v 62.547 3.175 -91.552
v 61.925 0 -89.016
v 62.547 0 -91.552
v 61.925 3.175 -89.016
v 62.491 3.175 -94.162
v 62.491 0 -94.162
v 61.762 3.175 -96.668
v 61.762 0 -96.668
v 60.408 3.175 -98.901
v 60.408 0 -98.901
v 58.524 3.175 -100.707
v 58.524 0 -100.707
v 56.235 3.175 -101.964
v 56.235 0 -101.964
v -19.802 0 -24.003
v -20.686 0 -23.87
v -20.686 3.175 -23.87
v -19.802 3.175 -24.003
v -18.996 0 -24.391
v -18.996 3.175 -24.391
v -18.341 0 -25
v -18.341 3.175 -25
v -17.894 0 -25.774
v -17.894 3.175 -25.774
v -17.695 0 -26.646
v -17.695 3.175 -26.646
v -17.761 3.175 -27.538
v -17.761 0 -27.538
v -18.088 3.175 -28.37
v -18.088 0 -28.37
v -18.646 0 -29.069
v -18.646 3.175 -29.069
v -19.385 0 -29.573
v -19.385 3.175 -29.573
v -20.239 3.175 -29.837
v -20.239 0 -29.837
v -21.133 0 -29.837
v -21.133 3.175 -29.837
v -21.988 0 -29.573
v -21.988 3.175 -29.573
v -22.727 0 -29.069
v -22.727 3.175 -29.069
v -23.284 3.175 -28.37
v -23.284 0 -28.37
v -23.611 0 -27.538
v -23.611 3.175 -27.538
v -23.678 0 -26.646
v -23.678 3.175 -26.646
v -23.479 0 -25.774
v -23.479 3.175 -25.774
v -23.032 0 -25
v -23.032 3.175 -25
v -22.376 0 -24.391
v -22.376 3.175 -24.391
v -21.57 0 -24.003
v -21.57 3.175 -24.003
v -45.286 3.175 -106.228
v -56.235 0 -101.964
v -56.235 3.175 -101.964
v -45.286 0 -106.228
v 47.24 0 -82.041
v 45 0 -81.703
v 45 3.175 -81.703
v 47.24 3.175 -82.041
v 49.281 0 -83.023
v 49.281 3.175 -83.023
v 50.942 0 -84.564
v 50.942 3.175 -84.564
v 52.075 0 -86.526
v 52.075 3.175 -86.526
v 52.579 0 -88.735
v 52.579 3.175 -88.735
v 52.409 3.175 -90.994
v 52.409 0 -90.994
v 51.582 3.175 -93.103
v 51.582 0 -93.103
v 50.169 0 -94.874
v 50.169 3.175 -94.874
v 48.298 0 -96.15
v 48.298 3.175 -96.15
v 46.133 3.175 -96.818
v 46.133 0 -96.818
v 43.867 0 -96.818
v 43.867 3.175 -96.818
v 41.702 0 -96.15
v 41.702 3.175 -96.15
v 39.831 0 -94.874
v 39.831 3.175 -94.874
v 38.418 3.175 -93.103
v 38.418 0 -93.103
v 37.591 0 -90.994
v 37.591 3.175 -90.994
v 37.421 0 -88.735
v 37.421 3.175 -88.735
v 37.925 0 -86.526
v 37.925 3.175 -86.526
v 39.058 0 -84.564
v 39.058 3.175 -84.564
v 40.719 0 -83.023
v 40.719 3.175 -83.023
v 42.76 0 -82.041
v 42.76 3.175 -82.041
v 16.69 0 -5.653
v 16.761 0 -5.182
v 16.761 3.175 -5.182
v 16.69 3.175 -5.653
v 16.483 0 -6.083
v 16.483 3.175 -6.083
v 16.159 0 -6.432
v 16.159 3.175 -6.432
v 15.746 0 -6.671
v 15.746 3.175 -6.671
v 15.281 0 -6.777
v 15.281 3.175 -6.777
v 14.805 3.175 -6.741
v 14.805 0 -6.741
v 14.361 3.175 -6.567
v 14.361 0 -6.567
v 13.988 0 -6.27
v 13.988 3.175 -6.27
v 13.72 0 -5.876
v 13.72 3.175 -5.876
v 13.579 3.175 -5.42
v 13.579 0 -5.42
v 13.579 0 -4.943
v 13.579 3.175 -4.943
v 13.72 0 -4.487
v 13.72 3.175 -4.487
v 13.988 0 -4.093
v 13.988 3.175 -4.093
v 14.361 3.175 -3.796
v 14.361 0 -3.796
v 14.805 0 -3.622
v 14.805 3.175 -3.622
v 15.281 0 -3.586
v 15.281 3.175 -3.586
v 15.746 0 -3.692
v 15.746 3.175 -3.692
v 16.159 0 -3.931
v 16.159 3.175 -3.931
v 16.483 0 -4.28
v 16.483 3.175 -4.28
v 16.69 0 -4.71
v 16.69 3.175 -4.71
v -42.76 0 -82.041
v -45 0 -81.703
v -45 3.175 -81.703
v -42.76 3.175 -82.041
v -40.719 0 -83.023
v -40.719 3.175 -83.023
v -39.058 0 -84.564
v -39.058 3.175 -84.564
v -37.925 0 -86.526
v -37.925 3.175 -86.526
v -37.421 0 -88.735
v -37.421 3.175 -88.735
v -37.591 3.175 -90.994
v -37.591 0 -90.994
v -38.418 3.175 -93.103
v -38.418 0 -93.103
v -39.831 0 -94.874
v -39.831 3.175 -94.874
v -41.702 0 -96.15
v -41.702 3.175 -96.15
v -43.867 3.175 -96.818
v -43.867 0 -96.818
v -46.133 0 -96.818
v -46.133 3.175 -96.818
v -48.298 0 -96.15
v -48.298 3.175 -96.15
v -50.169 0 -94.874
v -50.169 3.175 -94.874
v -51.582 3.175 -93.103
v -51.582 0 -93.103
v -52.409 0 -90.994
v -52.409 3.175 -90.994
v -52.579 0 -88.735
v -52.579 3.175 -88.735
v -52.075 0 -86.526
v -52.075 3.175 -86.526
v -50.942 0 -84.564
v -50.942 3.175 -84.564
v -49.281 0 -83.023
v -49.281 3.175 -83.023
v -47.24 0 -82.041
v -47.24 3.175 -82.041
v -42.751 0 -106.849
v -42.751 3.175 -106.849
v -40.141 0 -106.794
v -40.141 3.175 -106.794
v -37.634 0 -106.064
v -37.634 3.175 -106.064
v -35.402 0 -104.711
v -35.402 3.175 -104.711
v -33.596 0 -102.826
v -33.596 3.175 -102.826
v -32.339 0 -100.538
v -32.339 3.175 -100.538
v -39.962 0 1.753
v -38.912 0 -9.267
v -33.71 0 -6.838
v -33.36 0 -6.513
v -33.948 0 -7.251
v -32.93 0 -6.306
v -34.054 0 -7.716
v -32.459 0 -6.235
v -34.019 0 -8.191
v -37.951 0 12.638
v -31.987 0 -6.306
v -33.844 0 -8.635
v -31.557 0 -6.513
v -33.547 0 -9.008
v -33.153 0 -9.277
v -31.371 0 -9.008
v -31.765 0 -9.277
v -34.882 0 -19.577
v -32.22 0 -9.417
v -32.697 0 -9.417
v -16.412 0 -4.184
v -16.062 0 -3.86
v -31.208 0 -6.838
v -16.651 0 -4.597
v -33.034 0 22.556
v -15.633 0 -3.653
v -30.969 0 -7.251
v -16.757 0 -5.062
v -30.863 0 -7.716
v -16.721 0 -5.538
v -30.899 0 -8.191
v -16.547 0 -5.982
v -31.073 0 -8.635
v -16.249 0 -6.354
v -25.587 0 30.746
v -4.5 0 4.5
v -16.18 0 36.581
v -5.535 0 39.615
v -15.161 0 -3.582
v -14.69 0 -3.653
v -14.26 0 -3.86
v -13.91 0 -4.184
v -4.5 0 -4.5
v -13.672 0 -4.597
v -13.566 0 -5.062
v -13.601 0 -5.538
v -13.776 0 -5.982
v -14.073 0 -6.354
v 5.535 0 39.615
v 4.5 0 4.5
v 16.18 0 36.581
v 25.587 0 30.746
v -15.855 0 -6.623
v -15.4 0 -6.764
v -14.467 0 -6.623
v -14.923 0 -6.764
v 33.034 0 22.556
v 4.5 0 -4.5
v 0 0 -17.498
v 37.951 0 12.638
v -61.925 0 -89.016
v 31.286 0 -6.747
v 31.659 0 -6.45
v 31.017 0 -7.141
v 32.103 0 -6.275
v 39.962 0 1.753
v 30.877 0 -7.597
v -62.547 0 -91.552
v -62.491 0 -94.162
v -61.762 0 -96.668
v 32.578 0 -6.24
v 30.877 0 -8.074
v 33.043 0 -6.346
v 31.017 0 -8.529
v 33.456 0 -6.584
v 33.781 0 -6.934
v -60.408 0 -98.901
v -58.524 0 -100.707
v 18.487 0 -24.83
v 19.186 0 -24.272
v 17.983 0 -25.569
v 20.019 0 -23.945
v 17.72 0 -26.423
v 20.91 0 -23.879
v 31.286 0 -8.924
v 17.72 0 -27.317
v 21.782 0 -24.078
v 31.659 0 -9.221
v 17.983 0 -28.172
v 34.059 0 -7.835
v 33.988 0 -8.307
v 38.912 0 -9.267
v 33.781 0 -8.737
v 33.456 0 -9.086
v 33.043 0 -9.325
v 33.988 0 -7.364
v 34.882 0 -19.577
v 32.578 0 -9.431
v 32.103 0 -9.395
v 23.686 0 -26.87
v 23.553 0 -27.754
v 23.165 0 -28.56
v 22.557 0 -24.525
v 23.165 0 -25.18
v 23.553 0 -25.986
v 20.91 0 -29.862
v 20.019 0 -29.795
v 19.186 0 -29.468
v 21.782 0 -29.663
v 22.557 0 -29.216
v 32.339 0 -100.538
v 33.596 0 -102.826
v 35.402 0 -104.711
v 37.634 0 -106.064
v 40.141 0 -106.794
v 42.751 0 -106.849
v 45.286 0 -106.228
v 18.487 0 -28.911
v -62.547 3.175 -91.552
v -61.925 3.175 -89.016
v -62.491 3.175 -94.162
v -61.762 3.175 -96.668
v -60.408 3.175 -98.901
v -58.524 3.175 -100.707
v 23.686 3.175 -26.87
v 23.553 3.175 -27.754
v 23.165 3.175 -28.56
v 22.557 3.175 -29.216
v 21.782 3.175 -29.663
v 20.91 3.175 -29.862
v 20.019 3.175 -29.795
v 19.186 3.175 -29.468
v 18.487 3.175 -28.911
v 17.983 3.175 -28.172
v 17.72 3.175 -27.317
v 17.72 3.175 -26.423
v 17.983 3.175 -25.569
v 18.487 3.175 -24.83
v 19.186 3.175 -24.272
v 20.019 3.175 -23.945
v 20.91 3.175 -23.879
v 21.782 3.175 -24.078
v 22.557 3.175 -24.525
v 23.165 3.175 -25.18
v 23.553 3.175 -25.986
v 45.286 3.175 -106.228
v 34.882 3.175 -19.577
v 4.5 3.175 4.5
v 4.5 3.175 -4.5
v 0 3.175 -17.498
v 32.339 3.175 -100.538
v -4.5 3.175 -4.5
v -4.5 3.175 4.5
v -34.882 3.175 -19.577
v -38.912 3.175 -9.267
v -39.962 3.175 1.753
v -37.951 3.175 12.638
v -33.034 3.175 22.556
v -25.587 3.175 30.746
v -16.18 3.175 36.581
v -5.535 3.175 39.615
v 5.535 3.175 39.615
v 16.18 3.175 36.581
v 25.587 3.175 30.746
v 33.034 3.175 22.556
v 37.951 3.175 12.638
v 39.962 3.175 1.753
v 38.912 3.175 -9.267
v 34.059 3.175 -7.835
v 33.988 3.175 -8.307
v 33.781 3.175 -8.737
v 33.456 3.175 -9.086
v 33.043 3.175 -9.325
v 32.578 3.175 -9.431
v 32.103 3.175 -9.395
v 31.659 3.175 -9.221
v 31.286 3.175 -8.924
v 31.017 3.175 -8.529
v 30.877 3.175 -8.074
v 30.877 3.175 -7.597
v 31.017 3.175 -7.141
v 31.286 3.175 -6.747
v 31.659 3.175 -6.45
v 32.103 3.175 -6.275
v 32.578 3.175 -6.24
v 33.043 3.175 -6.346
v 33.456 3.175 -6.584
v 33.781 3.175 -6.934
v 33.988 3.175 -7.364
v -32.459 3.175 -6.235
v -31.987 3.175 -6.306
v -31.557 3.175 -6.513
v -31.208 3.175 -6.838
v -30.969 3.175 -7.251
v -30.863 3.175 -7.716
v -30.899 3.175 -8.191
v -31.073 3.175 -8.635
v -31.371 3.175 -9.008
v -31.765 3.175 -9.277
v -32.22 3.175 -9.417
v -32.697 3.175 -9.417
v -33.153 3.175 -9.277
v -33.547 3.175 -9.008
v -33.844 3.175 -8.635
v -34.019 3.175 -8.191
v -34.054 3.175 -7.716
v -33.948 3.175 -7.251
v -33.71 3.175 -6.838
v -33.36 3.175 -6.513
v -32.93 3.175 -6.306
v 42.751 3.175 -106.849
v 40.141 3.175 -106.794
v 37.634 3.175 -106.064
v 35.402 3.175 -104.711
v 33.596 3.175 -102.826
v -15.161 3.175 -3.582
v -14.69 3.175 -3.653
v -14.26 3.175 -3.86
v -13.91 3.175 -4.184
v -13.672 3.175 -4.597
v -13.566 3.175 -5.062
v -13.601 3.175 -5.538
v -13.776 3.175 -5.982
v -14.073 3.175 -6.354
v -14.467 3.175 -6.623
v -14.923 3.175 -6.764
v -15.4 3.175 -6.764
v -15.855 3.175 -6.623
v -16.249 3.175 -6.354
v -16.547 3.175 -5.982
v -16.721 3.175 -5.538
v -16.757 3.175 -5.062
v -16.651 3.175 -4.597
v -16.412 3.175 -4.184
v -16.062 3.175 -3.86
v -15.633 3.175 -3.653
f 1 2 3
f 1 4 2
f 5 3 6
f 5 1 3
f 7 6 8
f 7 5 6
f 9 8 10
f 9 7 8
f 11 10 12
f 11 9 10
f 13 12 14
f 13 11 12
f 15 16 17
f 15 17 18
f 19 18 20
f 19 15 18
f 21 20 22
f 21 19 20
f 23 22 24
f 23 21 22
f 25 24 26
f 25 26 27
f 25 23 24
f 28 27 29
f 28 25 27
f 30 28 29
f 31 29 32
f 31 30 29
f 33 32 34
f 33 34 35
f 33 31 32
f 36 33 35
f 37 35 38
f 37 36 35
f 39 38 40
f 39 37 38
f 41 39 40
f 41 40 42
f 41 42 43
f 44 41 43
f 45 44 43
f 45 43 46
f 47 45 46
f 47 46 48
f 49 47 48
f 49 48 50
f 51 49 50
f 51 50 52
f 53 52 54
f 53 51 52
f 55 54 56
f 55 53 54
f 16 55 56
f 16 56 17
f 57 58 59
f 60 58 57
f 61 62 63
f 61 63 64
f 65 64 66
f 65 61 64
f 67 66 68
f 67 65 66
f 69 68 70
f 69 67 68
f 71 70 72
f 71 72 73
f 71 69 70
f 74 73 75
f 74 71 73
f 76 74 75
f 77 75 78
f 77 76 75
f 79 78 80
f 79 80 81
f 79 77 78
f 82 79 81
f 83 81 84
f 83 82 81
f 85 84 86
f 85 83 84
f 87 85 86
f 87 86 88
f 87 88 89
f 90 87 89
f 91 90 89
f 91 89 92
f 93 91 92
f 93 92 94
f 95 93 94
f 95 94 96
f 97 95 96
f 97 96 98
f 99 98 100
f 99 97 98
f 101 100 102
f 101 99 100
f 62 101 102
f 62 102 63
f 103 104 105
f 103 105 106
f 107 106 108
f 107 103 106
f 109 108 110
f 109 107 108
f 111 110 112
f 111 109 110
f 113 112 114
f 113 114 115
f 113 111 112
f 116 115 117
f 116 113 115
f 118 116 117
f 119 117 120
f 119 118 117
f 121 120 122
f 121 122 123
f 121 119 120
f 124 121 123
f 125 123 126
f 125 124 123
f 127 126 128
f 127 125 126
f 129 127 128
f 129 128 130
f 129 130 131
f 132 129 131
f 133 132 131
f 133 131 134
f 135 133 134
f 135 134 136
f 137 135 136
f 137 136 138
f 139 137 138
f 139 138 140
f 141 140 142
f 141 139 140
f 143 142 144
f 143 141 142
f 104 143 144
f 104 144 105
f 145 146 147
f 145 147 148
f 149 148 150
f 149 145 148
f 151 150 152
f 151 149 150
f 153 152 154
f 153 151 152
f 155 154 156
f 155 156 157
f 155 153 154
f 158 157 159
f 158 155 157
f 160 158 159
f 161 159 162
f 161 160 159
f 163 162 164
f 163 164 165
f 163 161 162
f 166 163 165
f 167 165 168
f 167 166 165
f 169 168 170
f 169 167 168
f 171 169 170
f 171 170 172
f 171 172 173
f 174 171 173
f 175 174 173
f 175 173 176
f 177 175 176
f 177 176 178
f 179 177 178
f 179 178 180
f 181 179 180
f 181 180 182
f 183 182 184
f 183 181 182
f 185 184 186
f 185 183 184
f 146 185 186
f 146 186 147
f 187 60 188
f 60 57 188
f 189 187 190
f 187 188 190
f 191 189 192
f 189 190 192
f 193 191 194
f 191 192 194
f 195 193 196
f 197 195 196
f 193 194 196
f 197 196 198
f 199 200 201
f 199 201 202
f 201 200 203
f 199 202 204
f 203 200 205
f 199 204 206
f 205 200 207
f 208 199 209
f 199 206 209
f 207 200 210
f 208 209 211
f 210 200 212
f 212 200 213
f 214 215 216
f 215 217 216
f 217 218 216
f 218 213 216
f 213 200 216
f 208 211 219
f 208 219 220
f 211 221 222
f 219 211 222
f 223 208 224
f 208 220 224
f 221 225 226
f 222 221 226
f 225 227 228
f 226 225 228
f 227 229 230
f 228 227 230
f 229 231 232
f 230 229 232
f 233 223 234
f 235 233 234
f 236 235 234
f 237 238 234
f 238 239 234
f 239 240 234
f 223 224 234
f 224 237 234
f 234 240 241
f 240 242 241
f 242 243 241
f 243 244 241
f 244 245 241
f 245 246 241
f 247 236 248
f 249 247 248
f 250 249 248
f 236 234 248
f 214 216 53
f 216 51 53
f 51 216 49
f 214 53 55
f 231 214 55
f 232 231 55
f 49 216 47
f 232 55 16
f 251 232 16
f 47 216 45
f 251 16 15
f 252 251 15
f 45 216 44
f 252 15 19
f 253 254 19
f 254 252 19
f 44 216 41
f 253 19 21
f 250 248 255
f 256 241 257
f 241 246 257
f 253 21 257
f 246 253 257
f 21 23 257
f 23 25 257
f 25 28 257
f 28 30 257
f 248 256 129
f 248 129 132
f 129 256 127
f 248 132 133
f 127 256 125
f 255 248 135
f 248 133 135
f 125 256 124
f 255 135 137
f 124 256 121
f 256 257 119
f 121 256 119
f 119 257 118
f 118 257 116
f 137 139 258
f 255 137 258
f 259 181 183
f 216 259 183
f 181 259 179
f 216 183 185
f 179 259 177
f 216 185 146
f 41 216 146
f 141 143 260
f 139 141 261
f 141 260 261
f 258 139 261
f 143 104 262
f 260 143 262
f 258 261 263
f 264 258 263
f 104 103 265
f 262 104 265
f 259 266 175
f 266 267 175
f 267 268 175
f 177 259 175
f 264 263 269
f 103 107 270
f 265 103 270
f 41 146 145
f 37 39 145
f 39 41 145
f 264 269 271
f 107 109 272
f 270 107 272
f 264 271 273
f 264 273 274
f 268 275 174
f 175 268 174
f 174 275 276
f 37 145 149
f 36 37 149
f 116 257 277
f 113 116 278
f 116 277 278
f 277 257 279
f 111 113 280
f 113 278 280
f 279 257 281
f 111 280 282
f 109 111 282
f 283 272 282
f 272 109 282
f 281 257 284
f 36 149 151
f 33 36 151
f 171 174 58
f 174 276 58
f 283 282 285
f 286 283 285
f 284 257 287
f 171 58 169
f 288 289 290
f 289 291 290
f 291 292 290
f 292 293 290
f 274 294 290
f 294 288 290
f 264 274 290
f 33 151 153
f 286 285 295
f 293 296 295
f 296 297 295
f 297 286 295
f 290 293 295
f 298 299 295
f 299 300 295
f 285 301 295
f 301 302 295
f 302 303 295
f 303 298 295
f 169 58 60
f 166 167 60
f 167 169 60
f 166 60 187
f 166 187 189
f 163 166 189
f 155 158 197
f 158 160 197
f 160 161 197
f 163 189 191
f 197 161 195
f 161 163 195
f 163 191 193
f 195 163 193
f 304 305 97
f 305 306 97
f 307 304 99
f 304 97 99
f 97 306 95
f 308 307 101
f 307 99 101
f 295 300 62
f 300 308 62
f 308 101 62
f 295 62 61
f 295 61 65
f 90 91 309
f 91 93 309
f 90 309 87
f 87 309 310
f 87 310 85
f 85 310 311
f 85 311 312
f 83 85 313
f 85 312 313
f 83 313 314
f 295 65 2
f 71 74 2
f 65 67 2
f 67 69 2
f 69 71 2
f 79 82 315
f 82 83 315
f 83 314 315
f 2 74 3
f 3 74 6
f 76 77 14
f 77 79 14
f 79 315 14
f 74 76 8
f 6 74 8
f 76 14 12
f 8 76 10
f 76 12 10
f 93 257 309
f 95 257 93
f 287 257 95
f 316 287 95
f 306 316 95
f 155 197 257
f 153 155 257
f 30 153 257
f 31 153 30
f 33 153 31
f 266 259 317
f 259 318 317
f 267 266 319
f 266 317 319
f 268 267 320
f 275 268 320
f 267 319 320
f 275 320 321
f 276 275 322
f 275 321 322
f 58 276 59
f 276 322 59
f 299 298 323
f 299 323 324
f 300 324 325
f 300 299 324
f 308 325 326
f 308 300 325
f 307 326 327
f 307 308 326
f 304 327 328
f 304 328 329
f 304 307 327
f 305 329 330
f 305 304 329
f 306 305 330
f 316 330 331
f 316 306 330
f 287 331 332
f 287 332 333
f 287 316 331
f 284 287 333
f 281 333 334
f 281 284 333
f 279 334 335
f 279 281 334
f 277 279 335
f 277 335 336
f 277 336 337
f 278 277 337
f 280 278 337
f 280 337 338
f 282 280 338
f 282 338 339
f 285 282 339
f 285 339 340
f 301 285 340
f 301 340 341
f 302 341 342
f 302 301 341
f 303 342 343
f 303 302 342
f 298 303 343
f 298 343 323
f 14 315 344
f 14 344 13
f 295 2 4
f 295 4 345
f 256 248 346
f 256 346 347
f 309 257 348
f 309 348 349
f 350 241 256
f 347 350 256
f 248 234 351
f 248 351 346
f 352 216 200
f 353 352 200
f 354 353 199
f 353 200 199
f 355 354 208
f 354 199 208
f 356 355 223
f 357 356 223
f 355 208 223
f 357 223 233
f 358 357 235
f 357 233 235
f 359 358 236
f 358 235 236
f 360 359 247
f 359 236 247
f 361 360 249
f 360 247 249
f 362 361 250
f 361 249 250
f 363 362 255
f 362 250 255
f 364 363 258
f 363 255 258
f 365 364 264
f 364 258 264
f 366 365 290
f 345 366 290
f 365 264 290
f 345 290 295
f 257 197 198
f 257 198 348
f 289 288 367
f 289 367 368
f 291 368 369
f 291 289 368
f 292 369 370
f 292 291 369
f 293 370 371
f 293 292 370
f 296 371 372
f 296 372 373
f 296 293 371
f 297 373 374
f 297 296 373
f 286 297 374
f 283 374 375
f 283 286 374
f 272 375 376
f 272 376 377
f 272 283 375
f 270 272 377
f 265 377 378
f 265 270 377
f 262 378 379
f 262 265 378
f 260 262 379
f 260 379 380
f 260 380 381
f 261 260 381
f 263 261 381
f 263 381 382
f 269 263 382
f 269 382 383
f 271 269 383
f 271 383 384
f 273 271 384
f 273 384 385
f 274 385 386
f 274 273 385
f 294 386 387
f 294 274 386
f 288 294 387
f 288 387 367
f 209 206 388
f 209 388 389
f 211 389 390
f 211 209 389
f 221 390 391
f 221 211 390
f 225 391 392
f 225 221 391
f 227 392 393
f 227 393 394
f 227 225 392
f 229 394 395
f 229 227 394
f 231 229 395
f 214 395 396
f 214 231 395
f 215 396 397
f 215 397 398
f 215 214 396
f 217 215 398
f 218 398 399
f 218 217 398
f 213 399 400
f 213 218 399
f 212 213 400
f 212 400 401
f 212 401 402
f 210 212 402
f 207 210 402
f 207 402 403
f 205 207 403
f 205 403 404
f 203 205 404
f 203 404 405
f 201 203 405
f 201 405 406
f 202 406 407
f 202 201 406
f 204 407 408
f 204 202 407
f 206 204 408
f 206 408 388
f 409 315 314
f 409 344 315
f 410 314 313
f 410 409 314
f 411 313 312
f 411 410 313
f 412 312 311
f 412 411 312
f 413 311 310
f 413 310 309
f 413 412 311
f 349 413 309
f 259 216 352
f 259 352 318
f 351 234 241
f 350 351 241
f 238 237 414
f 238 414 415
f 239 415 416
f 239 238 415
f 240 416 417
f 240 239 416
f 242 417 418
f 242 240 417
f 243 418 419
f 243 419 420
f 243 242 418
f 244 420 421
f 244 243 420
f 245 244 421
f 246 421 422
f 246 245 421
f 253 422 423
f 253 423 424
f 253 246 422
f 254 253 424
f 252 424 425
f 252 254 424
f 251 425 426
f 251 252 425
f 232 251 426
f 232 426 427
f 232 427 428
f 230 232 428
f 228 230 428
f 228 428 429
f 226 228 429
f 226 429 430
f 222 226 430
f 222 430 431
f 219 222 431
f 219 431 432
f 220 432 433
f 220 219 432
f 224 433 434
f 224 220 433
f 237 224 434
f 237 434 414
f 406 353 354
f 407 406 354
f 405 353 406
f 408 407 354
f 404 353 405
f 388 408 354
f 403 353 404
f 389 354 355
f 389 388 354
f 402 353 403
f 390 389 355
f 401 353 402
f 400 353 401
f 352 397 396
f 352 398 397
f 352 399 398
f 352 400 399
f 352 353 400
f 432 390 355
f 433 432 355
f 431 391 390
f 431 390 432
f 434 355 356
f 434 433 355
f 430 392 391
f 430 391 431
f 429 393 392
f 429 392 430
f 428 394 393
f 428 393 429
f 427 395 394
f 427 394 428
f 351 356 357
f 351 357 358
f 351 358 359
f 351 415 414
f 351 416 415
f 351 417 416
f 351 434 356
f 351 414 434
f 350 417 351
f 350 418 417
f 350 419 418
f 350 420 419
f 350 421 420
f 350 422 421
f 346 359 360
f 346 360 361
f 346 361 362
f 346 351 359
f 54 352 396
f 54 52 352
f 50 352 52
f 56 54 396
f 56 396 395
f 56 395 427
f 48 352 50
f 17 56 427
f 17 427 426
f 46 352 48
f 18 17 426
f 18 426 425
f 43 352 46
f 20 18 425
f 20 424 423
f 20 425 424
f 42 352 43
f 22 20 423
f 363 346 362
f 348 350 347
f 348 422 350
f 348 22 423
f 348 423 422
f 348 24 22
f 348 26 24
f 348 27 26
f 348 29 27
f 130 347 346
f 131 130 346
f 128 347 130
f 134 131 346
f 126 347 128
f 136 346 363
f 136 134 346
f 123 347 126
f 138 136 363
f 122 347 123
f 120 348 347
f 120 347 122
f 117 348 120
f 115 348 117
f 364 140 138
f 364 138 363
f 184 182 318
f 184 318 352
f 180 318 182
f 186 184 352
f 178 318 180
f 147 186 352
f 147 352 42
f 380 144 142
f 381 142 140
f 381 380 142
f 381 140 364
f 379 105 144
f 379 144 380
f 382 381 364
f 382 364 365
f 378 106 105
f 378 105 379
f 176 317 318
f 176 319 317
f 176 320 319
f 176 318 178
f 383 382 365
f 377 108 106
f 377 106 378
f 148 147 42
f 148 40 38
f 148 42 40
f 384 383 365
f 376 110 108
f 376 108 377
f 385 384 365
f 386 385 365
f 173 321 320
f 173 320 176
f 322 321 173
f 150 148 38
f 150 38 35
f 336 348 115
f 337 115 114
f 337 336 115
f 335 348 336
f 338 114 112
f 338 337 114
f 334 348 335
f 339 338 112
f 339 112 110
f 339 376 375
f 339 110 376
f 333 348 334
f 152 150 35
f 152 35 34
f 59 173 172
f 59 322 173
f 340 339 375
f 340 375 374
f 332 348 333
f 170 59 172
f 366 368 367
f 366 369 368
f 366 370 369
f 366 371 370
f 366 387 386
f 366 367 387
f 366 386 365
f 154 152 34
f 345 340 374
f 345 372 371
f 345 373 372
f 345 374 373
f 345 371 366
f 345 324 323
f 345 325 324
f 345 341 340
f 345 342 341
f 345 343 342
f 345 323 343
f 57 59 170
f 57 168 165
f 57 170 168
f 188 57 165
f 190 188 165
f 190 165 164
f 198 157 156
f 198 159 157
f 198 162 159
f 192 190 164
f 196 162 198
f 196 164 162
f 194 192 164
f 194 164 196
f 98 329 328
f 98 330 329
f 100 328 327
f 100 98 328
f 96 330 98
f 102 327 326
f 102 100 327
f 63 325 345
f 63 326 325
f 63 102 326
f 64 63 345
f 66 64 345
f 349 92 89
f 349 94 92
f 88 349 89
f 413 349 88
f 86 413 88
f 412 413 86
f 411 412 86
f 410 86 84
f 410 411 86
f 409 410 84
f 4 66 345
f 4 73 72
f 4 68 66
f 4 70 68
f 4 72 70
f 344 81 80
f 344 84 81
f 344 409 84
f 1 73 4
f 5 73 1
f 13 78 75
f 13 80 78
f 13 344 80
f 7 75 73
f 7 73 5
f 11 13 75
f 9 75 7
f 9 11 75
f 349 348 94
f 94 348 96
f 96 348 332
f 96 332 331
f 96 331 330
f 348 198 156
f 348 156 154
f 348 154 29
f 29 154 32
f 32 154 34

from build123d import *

# Parameters (mm, degrees)
SKETCH1_R           = 1.6
SKETCH1_R_2         = 3
SKETCH1_R_3         = 7.6
SKETCH1_W           = 9
SKETCH1_H           = 9
BOSS_EXTRUDE1_DEPTH = 3.175
FILLET1_R           = 10
MIRROR2_OUTLINE_R   = 3
MIRROR2_OUTLINE_R_2 = 1.6
MIRROR2_DEPTH       = 3.175


# Read off the part's stored shape, not the designer's step: Mirror2
with BuildPart() as part:
    # Sketch1 → Boss-Extrude1 (new body)
    # profile 1 of 2: a face of its own
    with BuildSketch(Plane(origin=(0, 0, 0), x_dir=(1, 0, 0), z_dir=(0, 1, 0))):
        with BuildLine():
            ThreePointArc((23.66850222, -9.217483532), (0, -25.4), (-23.66850222, -9.217483532))
            Line((-23.66850222, -9.217483532), (-65.553741095, 98.334742178))
            Line((-65.553741095, 98.334742178), (-35.96811332, 109.856596592))
            Line((-35.96811332, 109.856596592), (0, 17.498268312))
            Line((0, 17.498268312), (35.96811332, 109.856596592))
            Line((35.96811332, 109.856596592), (65.553741095, 98.334742178))
            Line((65.553741095, 98.334742178), (23.66850222, -9.217483532))
        make_face()
        with Locations(Location((-15.161153788, 5.181560445, 0), (0, 0, 270))):
            Circle(SKETCH1_R, mode=Mode.SUBTRACT)
        with Locations(Location((-20.686165487, 26.870192161, 0), (0, 0, 270))):
            Circle(SKETCH1_R_2, mode=Mode.SUBTRACT)
        with Locations(Location((-45, 89.302855497, 0), (0, 0, 270))):
            Circle(SKETCH1_R_3, mode=Mode.SUBTRACT)
        with Locations(Location((45, 89.302855497, 0), (0, 0, 270))):
            Circle(SKETCH1_R_3, mode=Mode.SUBTRACT)
        Rectangle(SKETCH1_W, SKETCH1_H, mode=Mode.SUBTRACT)
    # profile 2 of 2: a face of its own
    with BuildSketch(Plane(origin=(0, 0, 0), x_dir=(1, 0, 0), z_dir=(0, 1, 0))):
        with BuildLine():
            Line((-23.66850222, -9.217483532), (-34.882073701, 19.576540408))
            ThreePointArc((-34.882073701, 19.576540408), (0, -40), (34.882073701, 19.576540408))
            Line((34.882073701, 19.576540408), (23.66850222, -9.217483532))
            ThreePointArc((23.66850222, -9.217483532), (0, -25.4), (-23.66850222, -9.217483532))
        make_face()
        with Locations(Location((-32.458777971, 7.835274371, 0), (0, 0, 270))):
            Circle(SKETCH1_R, mode=Mode.SUBTRACT)
    extrude(amount=BOSS_EXTRUDE1_DEPTH)

    # Fillet1
    fillet1_edges = [part.edges().sort_by_distance(p)[0] for p in [
        (-65.553741095, 1.5875, -98.334742178),
        (-35.96811332, 1.5875, -109.856596592),
        (35.96811332, 1.5875, -109.856596592),
        (65.553741095, 1.5875, -98.334742178),
    ]]
    fillet(fillet1_edges, radius=FILLET1_R)

    # Mirror2 outline → Mirror2 (cut)
    with BuildSketch(Plane(origin=(0, 0, 0), x_dir=(1, 0, 0), z_dir=(0, 1, 0))):
        with Locations((20.686165487, 26.870192161)):
            Circle(MIRROR2_OUTLINE_R)
        with Locations((15.161153788, 5.181560445)):
            Circle(MIRROR2_OUTLINE_R_2)
        with Locations((32.458777971, 7.835274371)):
            Circle(MIRROR2_OUTLINE_R_2)
    extrude(amount=MIRROR2_DEPTH, mode=Mode.SUBTRACT)


solid = part.part
